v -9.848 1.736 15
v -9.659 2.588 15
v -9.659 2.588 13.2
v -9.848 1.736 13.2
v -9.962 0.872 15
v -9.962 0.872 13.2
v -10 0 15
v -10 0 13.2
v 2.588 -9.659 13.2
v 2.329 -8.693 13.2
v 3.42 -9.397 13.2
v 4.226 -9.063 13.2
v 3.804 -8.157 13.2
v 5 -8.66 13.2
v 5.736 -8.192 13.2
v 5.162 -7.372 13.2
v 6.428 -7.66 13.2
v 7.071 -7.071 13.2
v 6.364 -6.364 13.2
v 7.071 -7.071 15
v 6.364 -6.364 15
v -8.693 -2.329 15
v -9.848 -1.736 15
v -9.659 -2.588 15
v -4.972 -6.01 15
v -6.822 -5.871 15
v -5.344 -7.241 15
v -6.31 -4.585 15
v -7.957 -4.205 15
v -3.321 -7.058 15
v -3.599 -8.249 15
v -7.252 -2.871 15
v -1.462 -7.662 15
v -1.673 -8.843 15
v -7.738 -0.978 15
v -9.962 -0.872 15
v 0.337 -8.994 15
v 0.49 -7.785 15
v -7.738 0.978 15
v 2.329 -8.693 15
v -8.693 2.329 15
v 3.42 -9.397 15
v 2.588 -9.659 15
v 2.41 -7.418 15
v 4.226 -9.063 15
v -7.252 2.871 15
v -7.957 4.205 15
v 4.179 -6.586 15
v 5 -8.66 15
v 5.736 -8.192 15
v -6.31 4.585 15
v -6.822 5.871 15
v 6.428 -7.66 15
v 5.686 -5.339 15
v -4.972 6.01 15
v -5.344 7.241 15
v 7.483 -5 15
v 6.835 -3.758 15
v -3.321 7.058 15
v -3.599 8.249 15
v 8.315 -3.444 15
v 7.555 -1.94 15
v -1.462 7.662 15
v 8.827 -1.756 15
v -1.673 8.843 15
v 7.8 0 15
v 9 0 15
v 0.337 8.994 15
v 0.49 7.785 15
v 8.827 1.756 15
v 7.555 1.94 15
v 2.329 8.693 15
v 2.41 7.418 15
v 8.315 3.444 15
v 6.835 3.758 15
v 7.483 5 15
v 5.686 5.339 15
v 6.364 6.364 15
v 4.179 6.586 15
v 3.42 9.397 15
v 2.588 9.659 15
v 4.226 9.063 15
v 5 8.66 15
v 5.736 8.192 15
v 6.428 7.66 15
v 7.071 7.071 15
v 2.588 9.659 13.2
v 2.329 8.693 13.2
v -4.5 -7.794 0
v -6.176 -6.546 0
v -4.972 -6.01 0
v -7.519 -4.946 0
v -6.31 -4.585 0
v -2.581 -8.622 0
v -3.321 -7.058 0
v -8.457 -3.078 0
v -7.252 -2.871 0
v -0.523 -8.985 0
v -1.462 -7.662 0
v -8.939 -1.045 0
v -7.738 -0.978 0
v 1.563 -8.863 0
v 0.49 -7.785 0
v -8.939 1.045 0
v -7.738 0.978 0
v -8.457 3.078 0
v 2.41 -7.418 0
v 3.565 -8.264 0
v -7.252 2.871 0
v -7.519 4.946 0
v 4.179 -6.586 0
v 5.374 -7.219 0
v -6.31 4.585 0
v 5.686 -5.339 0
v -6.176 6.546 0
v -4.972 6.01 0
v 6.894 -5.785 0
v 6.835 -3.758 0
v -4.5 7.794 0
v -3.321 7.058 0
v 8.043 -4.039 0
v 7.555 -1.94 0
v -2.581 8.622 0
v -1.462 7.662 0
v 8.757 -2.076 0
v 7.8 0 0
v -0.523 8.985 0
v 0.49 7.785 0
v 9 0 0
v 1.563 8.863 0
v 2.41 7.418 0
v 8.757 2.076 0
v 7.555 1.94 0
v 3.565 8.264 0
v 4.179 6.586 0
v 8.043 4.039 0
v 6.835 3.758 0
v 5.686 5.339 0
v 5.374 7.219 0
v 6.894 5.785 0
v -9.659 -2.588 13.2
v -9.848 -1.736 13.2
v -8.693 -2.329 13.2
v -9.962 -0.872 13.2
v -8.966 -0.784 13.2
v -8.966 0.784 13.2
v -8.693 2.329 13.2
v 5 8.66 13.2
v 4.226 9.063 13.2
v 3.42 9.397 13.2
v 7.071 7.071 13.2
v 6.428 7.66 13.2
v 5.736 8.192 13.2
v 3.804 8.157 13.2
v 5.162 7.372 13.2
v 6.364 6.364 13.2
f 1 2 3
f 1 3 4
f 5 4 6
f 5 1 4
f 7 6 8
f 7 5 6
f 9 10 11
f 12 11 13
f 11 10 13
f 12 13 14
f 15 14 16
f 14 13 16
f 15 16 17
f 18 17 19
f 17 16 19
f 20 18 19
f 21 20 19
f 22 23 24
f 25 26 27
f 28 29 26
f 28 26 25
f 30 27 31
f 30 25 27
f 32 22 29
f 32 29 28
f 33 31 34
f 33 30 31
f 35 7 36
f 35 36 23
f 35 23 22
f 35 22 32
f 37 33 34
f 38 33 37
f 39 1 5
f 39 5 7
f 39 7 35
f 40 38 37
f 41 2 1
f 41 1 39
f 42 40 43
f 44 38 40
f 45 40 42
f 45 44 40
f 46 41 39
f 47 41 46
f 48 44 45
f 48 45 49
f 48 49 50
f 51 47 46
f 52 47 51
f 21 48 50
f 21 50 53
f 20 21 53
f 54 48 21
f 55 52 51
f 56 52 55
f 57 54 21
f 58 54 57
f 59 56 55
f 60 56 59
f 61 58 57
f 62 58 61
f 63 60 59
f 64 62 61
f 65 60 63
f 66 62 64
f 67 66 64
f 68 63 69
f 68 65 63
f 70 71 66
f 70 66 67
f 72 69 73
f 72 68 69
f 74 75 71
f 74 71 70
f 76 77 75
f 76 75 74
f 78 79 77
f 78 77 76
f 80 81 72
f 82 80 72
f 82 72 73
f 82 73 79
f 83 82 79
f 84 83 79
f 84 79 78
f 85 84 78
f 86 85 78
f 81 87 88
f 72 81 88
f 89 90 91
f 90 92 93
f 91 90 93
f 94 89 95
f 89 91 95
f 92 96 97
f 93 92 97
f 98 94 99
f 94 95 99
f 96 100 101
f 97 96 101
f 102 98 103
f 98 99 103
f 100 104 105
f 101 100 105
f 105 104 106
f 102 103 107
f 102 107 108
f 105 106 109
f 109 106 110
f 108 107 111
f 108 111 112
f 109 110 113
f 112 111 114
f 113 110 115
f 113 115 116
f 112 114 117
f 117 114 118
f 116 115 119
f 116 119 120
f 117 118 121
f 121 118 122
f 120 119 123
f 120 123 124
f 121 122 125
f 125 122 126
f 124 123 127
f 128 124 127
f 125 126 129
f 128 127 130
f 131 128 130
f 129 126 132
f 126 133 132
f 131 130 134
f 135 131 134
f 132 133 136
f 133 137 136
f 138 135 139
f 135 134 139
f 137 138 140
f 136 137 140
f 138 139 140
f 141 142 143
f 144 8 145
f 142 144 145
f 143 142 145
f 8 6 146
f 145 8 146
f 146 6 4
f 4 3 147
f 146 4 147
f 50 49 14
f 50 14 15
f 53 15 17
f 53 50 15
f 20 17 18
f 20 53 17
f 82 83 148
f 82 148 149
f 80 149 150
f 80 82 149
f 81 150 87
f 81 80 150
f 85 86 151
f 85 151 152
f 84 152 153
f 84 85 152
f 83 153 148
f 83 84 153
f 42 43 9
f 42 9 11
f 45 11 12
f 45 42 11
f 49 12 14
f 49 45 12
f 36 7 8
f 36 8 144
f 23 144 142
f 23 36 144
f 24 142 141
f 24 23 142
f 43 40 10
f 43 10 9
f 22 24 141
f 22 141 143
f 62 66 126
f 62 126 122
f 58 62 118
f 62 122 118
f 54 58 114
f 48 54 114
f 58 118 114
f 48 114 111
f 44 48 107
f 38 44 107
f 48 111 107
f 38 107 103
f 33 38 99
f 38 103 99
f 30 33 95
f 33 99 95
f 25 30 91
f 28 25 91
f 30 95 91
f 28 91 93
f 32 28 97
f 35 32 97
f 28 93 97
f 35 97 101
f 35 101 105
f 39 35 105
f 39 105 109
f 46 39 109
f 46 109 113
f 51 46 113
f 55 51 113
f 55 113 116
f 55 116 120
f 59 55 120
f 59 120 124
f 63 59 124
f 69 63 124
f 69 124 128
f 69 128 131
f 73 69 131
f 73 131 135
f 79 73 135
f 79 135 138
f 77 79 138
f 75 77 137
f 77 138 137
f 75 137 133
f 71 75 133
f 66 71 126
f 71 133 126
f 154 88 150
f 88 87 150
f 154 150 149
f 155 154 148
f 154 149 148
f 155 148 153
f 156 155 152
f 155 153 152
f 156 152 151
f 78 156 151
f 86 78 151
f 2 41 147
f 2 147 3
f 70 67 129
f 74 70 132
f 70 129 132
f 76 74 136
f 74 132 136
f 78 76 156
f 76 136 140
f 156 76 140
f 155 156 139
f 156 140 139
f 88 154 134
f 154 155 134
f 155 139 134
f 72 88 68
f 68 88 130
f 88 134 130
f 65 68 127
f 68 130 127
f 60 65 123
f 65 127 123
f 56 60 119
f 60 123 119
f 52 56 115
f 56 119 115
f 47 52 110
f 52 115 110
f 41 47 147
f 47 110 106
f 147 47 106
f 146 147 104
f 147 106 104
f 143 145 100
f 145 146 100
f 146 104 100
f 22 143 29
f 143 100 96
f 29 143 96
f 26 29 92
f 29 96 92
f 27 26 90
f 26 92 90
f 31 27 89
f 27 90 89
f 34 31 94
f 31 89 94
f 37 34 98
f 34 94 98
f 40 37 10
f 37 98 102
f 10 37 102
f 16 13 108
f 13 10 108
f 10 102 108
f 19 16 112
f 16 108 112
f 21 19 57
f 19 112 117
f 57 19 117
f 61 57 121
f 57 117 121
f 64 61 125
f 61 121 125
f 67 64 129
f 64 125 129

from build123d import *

# Parameters (mm, degrees)
F0_R     = 9
F1_DEPTH = 15
F3_DEPTH = 1.8
F4_R     = 7.8
F5_DEPTH = 25


with BuildPart() as f1:
    # F0 (on Top) → F1 (new body)
    with BuildSketch(Plane.XY):
        Circle(F0_R)
    extrude(amount=F1_DEPTH)

    # F2 (on face) → F3 (join)
    with BuildSketch(Plane.XY.offset(15)):
        with BuildLine():
            Line((6.363961, 6.363961), (7.071068, 7.071068))
            ThreePointArc((7.071068, 7.071068), (6.087614, 7.933533), (5, 8.660254))
            ThreePointArc((5, 8.660254), (3.826834, 9.238795), (2.58819, 9.659258))
            Line((2.58819, 9.659258), (2.329371, 8.693332))
            ThreePointArc((2.329371, 8.693332), (4.5, 7.794229), (6.363961, 6.363961))
        make_face()
        with BuildLine():
            ThreePointArc((5, -8.660254), (6.087614, -7.933533), (7.071068, -7.071068))
            Line((7.071068, -7.071068), (6.363961, -6.363961))
            ThreePointArc((6.363961, -6.363961), (4.5, -7.794229), (2.329371, -8.693332))
            Line((2.329371, -8.693332), (2.58819, -9.659258))
            ThreePointArc((2.58819, -9.659258), (3.826834, -9.238795), (5, -8.660254))
        make_face()
        with BuildLine():
            Line((-8.693332, 2.329371), (-9.659258, 2.58819))
            ThreePointArc((-9.659258, 2.58819), (-9.914449, 1.305262), (-10, 0))
            ThreePointArc((-10, 0), (-9.914449, -1.305262), (-9.659258, -2.58819))
            Line((-9.659258, -2.58819), (-8.693332, -2.329371))
            ThreePointArc((-8.693332, -2.329371), (-9, 0), (-8.693332, 2.329371))
        make_face()
    extrude(amount=-F3_DEPTH)

    # F4 (on face) → F5 (cut)
    with BuildSketch(Plane(origin=(0, 0, 0), x_dir=(1, 0, 0), z_dir=(0, 0, -1))):
        Circle(F4_R)
    extrude(amount=-F5_DEPTH, mode=Mode.SUBTRACT)


solid = f1.part
